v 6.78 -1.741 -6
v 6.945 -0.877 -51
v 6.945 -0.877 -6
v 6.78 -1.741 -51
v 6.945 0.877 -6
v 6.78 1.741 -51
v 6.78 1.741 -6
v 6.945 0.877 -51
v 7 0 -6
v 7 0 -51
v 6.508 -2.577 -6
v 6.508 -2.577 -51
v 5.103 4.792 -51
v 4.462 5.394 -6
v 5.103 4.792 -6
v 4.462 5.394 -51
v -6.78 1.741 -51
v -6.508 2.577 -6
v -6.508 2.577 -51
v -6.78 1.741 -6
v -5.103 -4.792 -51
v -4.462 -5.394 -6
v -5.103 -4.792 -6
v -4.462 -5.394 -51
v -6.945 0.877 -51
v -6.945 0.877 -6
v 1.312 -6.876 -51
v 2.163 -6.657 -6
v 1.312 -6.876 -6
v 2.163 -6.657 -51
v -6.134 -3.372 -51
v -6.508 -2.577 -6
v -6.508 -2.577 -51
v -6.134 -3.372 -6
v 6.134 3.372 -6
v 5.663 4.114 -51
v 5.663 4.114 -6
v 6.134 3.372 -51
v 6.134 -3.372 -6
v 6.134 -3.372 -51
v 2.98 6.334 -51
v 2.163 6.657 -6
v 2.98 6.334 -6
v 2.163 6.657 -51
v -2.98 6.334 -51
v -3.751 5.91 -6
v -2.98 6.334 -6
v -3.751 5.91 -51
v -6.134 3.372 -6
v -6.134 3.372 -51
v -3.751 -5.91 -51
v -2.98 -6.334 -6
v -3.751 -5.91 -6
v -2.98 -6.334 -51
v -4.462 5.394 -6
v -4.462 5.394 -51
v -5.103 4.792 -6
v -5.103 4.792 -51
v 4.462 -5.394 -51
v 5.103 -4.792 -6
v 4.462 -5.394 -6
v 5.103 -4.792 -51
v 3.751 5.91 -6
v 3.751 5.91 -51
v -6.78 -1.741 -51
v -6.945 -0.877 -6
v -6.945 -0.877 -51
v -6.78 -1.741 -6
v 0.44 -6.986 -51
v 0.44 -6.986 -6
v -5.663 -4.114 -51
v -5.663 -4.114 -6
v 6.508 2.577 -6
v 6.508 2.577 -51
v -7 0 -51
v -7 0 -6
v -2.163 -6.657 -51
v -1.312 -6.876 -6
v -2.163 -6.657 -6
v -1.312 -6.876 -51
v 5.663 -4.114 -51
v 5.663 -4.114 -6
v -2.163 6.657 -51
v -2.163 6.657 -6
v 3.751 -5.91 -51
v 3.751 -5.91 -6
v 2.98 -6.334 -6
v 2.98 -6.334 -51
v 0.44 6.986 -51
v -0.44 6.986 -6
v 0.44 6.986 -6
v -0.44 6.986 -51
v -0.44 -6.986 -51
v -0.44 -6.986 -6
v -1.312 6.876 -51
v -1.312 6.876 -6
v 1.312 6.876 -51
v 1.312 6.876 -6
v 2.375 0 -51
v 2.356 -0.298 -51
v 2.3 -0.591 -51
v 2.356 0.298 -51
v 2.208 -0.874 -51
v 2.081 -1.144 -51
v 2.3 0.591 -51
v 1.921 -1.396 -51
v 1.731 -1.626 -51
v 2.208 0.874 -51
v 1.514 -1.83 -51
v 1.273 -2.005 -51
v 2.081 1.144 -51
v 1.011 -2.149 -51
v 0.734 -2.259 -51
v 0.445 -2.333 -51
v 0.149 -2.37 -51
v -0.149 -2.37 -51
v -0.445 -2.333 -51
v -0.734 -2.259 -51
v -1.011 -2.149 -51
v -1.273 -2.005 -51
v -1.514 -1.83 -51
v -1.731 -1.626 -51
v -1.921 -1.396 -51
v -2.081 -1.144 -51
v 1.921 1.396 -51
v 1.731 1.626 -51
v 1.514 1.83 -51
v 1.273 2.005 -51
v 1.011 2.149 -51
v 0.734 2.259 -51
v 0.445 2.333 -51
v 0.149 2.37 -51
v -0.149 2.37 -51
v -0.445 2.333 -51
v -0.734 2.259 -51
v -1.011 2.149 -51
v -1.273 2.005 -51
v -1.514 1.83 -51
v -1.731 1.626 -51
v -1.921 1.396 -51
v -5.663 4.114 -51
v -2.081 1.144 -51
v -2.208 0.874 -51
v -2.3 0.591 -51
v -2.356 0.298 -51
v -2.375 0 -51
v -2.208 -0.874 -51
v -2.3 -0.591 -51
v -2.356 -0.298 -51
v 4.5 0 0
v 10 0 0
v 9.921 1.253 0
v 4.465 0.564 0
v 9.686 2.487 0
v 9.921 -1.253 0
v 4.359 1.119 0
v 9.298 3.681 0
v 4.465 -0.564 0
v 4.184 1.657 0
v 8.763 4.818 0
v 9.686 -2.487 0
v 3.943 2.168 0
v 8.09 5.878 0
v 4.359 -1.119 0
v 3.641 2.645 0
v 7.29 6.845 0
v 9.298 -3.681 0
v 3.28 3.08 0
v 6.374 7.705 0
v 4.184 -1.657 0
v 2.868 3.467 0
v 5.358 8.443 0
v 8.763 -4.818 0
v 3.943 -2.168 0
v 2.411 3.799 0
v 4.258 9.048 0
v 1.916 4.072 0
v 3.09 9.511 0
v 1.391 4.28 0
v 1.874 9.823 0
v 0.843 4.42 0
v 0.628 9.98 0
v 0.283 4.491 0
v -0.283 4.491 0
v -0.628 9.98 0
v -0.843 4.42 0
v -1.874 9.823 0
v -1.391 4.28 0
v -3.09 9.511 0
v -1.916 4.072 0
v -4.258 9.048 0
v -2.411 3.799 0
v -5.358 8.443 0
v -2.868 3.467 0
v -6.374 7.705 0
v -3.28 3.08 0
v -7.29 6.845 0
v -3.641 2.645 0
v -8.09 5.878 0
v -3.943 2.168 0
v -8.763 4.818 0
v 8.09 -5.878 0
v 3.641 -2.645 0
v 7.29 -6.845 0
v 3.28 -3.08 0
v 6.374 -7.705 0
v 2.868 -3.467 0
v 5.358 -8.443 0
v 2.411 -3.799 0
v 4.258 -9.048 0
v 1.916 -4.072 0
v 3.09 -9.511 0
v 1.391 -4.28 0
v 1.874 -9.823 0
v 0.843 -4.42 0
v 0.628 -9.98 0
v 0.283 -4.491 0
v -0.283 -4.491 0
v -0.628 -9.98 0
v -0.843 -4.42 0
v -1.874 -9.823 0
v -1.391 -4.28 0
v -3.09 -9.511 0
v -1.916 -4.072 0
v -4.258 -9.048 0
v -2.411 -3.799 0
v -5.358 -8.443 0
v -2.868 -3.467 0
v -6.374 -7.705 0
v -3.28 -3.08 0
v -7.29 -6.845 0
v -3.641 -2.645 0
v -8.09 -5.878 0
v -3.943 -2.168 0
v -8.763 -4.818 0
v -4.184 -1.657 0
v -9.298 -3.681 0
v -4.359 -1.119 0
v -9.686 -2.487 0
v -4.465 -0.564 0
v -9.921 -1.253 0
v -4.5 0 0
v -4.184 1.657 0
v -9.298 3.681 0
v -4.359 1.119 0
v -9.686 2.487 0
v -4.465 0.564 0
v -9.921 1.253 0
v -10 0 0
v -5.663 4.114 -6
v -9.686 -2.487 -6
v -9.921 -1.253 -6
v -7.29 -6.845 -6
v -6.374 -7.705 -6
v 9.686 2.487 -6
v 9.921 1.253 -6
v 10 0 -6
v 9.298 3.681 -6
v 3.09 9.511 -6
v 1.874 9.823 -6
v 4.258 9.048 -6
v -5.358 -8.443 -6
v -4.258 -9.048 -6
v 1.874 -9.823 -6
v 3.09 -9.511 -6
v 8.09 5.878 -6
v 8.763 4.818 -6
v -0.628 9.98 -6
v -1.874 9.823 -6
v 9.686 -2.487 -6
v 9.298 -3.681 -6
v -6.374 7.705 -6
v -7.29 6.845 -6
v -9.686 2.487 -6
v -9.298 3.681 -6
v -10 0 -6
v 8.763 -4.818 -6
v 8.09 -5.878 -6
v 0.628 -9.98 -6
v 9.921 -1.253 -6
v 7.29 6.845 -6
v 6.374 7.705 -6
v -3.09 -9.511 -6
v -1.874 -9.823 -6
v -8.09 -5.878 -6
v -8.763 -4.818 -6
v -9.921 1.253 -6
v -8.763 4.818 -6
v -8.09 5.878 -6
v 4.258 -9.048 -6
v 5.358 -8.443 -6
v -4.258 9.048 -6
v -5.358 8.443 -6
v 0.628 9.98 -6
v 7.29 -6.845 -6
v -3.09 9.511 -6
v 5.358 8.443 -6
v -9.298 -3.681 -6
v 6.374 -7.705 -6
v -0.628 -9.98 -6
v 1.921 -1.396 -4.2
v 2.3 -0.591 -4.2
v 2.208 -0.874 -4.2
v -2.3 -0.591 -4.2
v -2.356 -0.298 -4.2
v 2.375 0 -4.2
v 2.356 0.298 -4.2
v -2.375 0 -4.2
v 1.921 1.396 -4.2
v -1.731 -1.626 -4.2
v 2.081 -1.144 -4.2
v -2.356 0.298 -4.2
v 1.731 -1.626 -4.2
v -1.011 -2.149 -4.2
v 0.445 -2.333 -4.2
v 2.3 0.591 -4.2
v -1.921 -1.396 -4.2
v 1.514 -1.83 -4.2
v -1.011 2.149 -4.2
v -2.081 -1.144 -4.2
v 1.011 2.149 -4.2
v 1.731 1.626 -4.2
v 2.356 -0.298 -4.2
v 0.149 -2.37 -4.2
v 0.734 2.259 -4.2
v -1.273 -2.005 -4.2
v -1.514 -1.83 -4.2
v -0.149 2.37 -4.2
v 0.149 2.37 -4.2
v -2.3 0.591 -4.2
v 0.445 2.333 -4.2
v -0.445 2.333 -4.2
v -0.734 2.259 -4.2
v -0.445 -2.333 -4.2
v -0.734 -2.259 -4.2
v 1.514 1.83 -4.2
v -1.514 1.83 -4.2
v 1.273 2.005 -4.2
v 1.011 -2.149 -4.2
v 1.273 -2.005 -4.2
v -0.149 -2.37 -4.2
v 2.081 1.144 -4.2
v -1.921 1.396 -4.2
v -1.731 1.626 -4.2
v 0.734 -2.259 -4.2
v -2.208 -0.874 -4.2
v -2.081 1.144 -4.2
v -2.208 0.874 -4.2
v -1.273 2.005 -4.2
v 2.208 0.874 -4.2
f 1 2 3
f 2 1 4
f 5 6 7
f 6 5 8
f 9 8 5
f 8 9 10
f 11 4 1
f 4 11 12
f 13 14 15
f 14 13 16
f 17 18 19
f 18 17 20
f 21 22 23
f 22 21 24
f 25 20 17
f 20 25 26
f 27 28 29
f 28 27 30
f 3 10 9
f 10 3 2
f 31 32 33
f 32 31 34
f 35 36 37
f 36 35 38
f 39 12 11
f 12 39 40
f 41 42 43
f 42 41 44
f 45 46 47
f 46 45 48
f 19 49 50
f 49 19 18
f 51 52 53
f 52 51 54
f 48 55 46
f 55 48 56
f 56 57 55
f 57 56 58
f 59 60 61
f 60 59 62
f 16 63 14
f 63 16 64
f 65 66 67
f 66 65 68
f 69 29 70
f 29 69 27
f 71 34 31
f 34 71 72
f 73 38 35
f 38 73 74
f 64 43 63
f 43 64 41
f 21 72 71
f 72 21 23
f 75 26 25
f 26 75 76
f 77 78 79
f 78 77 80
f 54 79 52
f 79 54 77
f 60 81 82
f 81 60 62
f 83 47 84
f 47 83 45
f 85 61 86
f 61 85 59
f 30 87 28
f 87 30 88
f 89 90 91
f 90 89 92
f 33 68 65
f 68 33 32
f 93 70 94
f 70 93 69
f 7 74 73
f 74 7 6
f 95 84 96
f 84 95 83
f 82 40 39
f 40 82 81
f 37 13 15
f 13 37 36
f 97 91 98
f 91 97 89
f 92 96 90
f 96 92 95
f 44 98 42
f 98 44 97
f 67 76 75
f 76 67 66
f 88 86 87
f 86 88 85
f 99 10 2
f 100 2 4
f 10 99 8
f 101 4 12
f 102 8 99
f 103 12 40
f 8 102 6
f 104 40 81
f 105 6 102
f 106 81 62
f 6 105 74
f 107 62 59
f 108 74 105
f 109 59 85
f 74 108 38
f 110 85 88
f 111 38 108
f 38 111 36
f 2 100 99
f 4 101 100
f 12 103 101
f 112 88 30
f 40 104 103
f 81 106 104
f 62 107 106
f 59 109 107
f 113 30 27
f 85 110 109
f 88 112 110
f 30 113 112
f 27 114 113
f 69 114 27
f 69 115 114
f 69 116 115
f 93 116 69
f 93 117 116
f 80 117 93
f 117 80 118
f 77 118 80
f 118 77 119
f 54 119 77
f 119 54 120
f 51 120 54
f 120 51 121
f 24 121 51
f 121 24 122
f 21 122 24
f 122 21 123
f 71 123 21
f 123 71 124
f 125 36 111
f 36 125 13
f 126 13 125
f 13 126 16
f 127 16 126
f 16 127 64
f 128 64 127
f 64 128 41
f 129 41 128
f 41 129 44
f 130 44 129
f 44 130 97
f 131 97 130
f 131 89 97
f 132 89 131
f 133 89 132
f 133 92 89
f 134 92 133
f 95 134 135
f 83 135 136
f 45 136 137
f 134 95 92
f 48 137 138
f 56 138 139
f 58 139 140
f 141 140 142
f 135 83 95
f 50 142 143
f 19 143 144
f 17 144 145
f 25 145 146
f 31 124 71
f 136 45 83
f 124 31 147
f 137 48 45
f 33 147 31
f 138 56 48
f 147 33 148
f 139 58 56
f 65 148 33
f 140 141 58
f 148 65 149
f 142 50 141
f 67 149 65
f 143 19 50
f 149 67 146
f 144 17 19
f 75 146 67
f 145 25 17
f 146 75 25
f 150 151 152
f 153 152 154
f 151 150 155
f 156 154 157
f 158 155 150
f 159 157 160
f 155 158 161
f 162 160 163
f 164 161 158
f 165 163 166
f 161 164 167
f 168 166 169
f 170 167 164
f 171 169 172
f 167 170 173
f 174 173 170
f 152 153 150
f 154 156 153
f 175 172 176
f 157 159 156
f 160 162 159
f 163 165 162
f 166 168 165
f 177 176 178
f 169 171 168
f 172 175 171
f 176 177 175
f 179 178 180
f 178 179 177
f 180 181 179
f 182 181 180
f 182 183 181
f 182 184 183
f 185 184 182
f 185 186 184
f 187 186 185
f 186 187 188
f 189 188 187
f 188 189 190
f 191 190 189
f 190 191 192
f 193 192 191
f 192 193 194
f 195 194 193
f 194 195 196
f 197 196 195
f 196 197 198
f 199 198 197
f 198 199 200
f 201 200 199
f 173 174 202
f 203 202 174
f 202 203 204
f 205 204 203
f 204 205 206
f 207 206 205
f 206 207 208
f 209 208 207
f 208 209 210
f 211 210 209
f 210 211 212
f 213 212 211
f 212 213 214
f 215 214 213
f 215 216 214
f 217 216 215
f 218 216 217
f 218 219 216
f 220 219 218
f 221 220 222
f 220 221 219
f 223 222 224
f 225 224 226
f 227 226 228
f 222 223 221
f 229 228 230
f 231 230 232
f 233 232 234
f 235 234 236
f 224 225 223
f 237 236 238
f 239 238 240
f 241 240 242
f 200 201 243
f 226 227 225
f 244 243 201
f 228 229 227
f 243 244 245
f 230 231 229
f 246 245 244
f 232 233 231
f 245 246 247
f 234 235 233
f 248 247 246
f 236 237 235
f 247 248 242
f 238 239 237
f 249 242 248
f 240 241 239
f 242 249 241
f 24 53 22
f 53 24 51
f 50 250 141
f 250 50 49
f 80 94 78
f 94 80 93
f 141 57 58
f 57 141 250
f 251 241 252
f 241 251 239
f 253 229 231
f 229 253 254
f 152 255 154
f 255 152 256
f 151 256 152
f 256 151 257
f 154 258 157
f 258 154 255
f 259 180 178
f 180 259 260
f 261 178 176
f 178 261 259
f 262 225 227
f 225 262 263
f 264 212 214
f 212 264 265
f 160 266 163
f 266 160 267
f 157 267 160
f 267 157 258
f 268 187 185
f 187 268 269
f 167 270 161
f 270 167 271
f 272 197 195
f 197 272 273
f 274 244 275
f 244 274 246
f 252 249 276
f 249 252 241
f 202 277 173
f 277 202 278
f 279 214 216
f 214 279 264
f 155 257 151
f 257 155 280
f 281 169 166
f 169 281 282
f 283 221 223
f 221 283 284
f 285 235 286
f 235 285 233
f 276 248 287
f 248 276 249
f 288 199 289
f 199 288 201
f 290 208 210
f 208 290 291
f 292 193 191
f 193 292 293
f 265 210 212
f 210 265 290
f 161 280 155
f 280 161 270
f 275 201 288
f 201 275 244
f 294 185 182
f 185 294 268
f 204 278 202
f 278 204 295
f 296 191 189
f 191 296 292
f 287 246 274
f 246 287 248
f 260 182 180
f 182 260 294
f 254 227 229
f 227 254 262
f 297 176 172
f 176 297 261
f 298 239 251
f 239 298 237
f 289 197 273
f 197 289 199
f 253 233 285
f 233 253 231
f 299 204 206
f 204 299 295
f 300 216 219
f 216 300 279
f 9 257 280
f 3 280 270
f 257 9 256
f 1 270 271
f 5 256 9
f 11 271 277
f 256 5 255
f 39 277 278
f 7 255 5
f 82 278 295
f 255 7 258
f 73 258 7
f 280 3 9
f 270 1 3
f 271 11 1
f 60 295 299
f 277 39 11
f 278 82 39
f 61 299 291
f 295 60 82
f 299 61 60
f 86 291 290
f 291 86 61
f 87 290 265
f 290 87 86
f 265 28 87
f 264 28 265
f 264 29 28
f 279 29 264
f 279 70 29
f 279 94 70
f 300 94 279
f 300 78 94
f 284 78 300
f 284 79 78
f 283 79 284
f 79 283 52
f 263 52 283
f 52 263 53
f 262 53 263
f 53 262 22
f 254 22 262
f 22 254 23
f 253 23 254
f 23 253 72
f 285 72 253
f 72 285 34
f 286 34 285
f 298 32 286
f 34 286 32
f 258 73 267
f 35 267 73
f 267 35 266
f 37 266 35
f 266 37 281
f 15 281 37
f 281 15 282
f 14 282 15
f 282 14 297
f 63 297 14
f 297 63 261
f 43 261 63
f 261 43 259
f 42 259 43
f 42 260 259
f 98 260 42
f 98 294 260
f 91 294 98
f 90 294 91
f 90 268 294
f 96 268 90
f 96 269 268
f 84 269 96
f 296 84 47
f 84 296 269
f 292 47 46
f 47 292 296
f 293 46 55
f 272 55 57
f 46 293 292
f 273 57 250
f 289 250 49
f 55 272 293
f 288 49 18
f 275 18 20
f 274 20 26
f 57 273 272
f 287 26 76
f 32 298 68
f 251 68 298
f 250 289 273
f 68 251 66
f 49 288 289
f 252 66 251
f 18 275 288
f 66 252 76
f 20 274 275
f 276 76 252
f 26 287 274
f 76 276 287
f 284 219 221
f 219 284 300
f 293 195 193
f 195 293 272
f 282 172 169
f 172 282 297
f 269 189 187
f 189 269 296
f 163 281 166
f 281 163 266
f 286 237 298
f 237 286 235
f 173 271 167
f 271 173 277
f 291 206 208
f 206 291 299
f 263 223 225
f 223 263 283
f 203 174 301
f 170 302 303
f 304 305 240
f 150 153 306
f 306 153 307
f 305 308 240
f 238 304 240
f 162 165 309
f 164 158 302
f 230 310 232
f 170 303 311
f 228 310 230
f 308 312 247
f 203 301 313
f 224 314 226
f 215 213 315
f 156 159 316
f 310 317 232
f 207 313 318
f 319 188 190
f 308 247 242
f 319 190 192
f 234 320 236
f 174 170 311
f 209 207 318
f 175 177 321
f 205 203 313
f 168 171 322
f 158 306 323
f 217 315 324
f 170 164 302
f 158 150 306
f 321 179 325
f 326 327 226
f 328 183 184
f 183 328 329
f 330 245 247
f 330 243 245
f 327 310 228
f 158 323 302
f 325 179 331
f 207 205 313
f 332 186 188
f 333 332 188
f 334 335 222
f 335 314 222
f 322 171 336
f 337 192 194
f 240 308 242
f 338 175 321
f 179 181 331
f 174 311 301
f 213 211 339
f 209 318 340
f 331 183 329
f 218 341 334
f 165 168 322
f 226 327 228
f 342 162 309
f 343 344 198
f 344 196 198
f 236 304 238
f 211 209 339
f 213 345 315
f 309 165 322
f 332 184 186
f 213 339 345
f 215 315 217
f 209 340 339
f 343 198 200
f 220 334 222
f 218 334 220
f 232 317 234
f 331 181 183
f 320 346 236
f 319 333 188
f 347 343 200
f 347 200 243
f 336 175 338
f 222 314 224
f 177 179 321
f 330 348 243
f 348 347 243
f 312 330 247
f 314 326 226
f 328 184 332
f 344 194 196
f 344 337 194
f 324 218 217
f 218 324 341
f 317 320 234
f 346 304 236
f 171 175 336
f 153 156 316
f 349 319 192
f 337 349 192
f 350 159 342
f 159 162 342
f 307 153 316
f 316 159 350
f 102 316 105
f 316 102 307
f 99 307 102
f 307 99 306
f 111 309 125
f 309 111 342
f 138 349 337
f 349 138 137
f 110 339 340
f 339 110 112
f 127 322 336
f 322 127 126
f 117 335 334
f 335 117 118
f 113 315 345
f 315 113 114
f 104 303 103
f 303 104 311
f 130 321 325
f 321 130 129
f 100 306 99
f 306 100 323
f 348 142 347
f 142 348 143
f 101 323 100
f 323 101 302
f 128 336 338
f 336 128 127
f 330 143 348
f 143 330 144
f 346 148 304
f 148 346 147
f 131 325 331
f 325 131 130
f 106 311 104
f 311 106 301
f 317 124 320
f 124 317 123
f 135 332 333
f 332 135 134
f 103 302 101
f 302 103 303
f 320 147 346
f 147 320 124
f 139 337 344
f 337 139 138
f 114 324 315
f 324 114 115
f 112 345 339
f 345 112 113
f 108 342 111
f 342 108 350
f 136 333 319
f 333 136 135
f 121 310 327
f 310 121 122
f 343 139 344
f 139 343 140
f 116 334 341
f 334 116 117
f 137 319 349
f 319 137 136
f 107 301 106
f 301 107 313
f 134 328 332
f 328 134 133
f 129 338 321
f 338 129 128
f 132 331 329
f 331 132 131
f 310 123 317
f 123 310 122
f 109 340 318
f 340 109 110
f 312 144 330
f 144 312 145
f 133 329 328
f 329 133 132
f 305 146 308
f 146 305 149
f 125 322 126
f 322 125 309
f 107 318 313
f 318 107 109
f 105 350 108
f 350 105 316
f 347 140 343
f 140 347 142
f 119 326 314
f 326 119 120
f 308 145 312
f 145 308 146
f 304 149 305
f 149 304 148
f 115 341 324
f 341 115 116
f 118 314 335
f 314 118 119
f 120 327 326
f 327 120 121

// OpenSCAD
$fn = 50;


difference() {
	union() {
		translate(v = [0, 0, -51.0000000000]) {
			cylinder(h = 51, r = 7.0000000000);
		}
		translate(v = [0, 0, -6.0000000000]) {
			cylinder(h = 6, r = 10.0000000000);
		}
	}
	union() {
		translate(v = [0, 0, 0]) {
			rotate(a = [0, 0, 0]) {
				difference() {
					union() {
						#translate(v = [0, 0, -51.0000000000]) {
							cylinder(h = 51, r = 2.2500000000);
						}
						#translate(v = [0, 0, -4.2000000000]) {
							cylinder(h = 4.2000000000, r1 = 2.3750000000, r2 = 4.5000000000);
						}
						#translate(v = [0, 0, -51.0000000000]) {
							cylinder(h = 51, r = 2.3750000000);
						}
						#translate(v = [0, 0, -51.0000000000]) {
							cylinder(h = 51, r = 2.2500000000);
						}
					}
					union();
				}
			}
		}
	}
}
